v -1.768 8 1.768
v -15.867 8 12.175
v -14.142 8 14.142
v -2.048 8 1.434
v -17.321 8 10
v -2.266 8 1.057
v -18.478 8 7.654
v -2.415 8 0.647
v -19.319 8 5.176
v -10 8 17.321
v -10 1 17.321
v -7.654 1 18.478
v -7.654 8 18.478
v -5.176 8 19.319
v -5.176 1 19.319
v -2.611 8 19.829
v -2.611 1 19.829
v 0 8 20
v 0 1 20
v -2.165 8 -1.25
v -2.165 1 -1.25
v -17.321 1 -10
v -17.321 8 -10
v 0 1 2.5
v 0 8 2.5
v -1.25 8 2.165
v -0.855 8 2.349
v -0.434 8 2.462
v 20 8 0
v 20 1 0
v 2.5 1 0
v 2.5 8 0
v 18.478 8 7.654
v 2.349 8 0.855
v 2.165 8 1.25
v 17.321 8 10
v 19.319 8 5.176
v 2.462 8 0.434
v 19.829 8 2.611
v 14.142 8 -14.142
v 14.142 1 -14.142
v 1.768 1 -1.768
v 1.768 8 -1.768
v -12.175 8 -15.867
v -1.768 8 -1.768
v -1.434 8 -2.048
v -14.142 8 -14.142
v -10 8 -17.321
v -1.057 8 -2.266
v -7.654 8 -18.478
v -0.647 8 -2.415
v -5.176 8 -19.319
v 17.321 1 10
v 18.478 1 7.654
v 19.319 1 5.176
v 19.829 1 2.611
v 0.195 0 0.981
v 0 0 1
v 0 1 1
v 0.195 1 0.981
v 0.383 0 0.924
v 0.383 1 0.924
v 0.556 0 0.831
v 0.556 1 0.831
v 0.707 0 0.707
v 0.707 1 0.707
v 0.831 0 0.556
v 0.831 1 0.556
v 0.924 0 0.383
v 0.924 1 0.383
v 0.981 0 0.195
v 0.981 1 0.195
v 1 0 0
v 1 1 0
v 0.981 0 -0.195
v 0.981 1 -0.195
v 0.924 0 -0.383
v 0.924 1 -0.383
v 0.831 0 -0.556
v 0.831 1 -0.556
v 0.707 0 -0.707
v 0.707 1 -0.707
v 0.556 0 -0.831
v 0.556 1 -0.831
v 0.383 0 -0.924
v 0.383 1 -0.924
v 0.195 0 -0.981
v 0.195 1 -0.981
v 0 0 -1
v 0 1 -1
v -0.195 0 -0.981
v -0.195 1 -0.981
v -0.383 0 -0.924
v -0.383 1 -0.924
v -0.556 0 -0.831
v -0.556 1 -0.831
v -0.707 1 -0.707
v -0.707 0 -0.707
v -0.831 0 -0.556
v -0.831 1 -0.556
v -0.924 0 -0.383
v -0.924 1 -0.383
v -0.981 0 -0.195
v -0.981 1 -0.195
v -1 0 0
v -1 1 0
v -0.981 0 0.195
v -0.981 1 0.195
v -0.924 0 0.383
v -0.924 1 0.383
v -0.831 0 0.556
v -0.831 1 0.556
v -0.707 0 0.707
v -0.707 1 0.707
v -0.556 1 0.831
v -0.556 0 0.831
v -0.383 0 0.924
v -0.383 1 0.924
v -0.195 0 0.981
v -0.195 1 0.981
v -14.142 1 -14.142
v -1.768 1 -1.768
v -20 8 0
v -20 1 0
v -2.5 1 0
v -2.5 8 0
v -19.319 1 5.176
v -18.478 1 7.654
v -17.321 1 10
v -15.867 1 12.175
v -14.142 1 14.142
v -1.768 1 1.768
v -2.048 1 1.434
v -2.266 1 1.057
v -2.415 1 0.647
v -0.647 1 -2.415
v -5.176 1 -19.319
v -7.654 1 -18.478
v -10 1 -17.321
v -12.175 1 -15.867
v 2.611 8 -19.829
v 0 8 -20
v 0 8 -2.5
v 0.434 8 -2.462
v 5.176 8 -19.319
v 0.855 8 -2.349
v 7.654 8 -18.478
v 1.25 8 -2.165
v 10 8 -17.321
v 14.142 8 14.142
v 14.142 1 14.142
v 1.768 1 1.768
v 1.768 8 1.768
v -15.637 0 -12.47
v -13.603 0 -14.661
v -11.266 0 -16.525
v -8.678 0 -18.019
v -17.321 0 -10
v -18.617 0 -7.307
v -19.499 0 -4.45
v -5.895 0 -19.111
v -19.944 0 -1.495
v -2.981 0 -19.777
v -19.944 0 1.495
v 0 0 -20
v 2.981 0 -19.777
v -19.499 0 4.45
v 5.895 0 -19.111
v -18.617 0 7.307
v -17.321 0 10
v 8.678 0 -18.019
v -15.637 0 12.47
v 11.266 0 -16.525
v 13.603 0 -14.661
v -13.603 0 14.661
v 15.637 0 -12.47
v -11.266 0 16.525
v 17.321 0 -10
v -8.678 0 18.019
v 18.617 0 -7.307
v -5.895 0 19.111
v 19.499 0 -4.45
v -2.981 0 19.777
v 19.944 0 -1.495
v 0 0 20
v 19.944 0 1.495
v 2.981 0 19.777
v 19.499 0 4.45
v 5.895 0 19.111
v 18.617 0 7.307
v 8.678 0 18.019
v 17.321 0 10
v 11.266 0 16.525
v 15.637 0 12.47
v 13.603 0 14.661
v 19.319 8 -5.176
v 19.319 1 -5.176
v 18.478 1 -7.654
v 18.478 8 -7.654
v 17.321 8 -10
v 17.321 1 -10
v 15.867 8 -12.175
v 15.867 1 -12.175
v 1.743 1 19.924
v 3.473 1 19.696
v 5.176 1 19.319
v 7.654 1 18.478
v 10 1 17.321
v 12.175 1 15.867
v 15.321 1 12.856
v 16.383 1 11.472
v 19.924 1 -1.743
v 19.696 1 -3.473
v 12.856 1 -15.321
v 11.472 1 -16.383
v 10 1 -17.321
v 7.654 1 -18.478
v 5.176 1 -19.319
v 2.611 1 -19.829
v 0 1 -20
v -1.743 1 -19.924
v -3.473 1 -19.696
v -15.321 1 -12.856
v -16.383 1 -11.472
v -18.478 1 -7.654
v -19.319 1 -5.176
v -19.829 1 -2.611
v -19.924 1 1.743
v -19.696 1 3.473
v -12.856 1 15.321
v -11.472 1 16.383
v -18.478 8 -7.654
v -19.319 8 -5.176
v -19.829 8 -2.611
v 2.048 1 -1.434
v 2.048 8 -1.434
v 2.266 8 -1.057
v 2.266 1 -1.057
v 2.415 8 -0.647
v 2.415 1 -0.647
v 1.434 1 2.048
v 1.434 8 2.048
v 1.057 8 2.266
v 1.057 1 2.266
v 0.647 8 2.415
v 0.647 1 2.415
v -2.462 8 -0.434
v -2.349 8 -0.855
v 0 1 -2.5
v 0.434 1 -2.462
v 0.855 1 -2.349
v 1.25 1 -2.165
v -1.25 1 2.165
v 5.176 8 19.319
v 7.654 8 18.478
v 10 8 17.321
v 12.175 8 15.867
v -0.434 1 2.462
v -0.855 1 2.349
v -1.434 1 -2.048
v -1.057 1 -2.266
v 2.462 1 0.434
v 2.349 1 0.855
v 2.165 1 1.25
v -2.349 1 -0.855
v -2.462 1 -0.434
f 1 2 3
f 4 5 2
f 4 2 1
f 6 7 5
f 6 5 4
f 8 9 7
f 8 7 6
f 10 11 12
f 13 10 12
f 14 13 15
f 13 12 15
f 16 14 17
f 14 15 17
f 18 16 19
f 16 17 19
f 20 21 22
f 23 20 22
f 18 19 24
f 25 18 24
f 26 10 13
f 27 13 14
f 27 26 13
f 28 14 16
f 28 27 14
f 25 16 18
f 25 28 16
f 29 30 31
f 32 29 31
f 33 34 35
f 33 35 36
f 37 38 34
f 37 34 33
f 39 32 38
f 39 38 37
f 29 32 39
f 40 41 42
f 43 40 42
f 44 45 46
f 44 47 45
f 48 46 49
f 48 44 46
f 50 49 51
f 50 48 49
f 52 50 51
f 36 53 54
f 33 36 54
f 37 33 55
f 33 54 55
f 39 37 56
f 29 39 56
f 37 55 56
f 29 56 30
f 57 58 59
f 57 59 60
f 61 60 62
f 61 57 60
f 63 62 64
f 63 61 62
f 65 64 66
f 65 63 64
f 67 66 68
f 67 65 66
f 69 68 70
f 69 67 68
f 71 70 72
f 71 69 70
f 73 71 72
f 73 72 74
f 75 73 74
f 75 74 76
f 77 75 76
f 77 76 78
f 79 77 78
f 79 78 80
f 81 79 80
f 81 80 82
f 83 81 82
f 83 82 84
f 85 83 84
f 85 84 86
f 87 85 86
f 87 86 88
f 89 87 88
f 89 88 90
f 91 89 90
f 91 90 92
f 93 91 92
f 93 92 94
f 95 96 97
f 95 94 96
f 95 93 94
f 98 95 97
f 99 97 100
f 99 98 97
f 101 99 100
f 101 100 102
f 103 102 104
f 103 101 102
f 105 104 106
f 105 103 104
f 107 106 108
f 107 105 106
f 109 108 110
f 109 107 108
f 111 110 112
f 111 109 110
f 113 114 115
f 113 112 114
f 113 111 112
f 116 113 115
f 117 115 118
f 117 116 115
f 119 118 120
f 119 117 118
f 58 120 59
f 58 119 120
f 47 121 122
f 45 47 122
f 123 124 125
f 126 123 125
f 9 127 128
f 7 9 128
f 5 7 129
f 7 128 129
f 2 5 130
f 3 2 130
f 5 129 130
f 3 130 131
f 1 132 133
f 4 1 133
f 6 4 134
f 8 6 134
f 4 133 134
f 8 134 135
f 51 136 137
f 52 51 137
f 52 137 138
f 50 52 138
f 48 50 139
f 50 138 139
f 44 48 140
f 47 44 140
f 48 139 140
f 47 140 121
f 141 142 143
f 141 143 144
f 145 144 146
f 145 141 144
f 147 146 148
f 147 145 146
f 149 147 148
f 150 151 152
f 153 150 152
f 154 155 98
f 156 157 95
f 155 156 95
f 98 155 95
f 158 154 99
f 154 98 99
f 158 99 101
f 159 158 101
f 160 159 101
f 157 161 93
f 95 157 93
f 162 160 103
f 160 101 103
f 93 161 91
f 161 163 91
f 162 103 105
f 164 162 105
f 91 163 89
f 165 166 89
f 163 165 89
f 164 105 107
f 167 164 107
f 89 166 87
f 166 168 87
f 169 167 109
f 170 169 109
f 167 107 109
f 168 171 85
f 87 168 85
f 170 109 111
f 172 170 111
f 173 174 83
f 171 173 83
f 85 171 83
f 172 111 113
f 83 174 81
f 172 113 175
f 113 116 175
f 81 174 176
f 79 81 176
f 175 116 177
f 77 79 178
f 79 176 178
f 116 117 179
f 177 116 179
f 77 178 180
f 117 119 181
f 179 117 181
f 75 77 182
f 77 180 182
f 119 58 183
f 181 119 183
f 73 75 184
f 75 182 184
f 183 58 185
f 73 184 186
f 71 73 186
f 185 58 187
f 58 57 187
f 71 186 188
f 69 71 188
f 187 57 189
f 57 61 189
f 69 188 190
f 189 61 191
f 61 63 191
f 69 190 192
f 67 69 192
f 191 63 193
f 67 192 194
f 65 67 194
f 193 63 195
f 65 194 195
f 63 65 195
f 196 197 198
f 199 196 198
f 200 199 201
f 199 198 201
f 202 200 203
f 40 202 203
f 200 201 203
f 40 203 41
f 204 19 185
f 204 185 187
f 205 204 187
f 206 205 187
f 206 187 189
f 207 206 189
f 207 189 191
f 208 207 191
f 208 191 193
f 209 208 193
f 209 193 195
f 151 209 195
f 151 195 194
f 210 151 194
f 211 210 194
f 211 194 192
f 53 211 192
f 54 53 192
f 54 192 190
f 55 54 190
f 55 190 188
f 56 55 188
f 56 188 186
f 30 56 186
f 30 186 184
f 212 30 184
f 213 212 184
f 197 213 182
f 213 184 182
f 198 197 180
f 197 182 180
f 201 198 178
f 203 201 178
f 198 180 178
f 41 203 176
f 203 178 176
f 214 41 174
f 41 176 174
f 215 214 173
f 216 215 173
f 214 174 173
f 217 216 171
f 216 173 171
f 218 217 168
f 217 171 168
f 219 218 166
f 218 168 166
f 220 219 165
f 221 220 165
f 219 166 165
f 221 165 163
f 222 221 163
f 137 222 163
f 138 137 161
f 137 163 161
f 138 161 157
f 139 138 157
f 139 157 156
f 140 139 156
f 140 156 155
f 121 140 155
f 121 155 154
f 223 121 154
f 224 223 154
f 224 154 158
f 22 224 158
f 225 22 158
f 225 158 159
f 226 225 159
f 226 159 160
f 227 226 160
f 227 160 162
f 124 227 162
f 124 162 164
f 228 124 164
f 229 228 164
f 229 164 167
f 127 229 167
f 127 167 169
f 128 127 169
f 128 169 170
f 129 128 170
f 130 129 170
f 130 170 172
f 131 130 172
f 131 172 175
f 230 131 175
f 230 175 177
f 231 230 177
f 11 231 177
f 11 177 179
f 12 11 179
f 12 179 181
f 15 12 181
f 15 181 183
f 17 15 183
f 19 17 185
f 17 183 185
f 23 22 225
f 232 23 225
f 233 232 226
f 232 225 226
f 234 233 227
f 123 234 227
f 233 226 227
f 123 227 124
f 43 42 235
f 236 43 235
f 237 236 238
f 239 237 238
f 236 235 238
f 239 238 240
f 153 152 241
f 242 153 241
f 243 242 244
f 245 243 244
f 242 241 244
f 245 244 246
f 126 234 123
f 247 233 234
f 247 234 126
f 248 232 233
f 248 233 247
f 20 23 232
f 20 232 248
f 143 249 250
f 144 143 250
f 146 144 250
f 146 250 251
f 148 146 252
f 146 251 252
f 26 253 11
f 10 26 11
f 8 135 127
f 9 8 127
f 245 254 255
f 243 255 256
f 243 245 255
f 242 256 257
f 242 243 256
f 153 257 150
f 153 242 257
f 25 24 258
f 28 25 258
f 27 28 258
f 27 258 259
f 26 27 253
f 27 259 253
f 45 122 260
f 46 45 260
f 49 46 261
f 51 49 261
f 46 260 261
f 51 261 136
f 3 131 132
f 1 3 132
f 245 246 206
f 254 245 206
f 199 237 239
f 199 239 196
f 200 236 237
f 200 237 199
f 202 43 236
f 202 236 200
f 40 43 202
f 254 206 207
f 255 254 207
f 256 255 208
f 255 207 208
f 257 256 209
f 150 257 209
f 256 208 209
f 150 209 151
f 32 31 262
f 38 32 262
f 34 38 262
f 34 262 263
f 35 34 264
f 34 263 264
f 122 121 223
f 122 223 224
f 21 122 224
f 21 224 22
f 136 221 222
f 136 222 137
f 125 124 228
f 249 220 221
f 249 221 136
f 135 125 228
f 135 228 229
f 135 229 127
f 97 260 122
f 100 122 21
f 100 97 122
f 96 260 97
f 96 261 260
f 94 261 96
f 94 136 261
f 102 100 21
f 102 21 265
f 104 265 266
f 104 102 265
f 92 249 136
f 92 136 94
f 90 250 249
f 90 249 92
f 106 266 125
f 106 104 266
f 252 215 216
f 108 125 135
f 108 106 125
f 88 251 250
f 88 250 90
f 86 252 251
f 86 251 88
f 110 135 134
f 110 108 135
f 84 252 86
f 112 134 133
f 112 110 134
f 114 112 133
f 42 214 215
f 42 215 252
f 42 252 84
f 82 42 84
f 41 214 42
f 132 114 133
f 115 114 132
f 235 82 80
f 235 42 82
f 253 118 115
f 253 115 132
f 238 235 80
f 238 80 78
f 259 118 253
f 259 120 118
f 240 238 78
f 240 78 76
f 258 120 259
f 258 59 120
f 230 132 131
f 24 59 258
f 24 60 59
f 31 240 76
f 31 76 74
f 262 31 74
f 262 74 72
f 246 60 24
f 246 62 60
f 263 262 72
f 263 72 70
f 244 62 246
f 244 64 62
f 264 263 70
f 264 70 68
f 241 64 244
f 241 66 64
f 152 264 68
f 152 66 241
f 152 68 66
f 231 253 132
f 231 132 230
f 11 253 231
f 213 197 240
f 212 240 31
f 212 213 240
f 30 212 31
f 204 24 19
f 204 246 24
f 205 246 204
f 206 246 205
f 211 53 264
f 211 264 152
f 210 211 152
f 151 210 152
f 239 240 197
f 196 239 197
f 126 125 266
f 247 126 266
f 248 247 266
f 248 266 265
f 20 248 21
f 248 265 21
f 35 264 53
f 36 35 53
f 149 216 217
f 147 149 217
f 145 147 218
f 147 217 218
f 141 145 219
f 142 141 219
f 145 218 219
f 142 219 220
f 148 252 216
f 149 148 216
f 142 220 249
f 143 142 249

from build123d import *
from build123d.topology import SkipClean

# Parameters (mm, degrees)
SKETCH1_R                             = 20
FIRST_EXTRUDE_FOR_RUBBER_PIECE_DEPTH  = 1
SECOND_EXTRUDE_FOR_RUBBER_PIECE_DEPTH = 7
HOLE_FOR_SCREW_RUBBER_DEPTH           = 23
HOLE_FOR_SCREW_RUBBER_DEPTH_BACK      = 15
SKETCH3_R                             = 1


with BuildPart() as part:
    # Sketch1 → First Extrude for Rubber Piece (new body)
    with BuildSketch(Plane(origin=(0, 0, 0), x_dir=(1, 0, 0), z_dir=(0, 1, 0))):
        Circle(SKETCH1_R)
    extrude(amount=FIRST_EXTRUDE_FOR_RUBBER_PIECE_DEPTH)

    # Sketch2 → Second Extrude for Rubber Piece (add)
    with SkipClean():  # the faces are left unmerged after this step: merging them gives an invalid solid
        with BuildSketch(Plane(origin=(0, 1, 0), x_dir=(1, 0, 0), z_dir=(0, 1, 0))):
            with BuildLine():
                Line((0, 20), (0, 2.5))
                ThreePointArc((0, 2.5), (0.647047613, 2.414814566), (1.25, 2.165063509))
                Line((1.25, 2.165063509), (10, 17.320508076))
                ThreePointArc((10, 17.320508076), (5.176380902, 19.318516526), (0, 20))
            make_face()
            with BuildLine():
                ThreePointArc((-1.767766953, 1.767766953), (-1.25, 2.165063509), (-0.647047613, 2.414814566))
                Line((-0.647047613, 2.414814566), (-5.176380902, 19.318516526))
                ThreePointArc((-5.176380902, 19.318516526), (-10, 17.320508076), (-14.142135624, 14.142135624))
                Line((-14.142135624, 14.142135624), (-1.767766953, 1.767766953))
            make_face()
            with BuildLine():
                Line((14.142135624, 14.142135624), (1.767766953, 1.767766953))
                ThreePointArc((1.767766953, 1.767766953), (2.165063509, 1.25), (2.414814566, 0.647047613))
                Line((2.414814566, 0.647047613), (19.318516526, 5.176380902))
                ThreePointArc((19.318516526, 5.176380902), (17.320508076, 10), (14.142135624, 14.142135624))
            make_face()
            with BuildLine():
                ThreePointArc((-2.5, 0), (-2.414814566, 0.647047613), (-2.165063509, 1.25))
                Line((-2.165063509, 1.25), (-17.320508076, 10))
                ThreePointArc((-17.320508076, 10), (-19.318516526, 5.176380902), (-20, 0))
                Line((-20, 0), (-2.5, 0))
            make_face()
            with BuildLine():
                Line((20, 0), (2.5, 0))
                ThreePointArc((2.5, 0), (2.414814566, -0.647047613), (2.165063509, -1.25))
                Line((2.165063509, -1.25), (17.320508076, -10))
                ThreePointArc((17.320508076, -10), (19.318516526, -5.176380902), (20, 0))
            make_face()
            with BuildLine():
                ThreePointArc((-1.767766953, -1.767766953), (-2.165063509, -1.25), (-2.414814566, -0.647047613))
                Line((-2.414814566, -0.647047613), (-19.318516526, -5.176380902))
                ThreePointArc((-19.318516526, -5.176380902), (-17.320508076, -10), (-14.142135624, -14.142135624))
                Line((-14.142135624, -14.142135624), (-1.767766953, -1.767766953))
            make_face()
            with BuildLine():
                Line((14.142135624, -14.142135624), (1.767766953, -1.767766953))
                ThreePointArc((1.767766953, -1.767766953), (1.25, -2.165063509), (0.647047613, -2.414814566))
                Line((0.647047613, -2.414814566), (5.176380902, -19.318516526))
                ThreePointArc((5.176380902, -19.318516526), (10, -17.320508076), (14.142135624, -14.142135624))
            make_face()
            with BuildLine():
                ThreePointArc((0, -2.5), (-0.647047613, -2.414814566), (-1.25, -2.165063509))
                Line((-1.25, -2.165063509), (-10, -17.320508076))
                ThreePointArc((-10, -17.320508076), (-5.176380902, -19.318516526), (0, -20))
                Line((0, -20), (0, -2.5))
            make_face()
        extrude(amount=SECOND_EXTRUDE_FOR_RUBBER_PIECE_DEPTH)

    # Sketch3 → Hole for Screw (Rubber) (cut, two sides: drawn at the far end of the back side and taken through both)
    with SkipClean():  # the faces are left unmerged after this step: merging them gives an invalid solid
        with BuildSketch(Plane(origin=(0, 1, 0), x_dir=(1, 0, 0), z_dir=(0, 1, 0)).offset(-HOLE_FOR_SCREW_RUBBER_DEPTH_BACK)):
            Circle(SKETCH3_R)
        extrude(amount=HOLE_FOR_SCREW_RUBBER_DEPTH + HOLE_FOR_SCREW_RUBBER_DEPTH_BACK, mode=Mode.SUBTRACT)


solid = part.part
